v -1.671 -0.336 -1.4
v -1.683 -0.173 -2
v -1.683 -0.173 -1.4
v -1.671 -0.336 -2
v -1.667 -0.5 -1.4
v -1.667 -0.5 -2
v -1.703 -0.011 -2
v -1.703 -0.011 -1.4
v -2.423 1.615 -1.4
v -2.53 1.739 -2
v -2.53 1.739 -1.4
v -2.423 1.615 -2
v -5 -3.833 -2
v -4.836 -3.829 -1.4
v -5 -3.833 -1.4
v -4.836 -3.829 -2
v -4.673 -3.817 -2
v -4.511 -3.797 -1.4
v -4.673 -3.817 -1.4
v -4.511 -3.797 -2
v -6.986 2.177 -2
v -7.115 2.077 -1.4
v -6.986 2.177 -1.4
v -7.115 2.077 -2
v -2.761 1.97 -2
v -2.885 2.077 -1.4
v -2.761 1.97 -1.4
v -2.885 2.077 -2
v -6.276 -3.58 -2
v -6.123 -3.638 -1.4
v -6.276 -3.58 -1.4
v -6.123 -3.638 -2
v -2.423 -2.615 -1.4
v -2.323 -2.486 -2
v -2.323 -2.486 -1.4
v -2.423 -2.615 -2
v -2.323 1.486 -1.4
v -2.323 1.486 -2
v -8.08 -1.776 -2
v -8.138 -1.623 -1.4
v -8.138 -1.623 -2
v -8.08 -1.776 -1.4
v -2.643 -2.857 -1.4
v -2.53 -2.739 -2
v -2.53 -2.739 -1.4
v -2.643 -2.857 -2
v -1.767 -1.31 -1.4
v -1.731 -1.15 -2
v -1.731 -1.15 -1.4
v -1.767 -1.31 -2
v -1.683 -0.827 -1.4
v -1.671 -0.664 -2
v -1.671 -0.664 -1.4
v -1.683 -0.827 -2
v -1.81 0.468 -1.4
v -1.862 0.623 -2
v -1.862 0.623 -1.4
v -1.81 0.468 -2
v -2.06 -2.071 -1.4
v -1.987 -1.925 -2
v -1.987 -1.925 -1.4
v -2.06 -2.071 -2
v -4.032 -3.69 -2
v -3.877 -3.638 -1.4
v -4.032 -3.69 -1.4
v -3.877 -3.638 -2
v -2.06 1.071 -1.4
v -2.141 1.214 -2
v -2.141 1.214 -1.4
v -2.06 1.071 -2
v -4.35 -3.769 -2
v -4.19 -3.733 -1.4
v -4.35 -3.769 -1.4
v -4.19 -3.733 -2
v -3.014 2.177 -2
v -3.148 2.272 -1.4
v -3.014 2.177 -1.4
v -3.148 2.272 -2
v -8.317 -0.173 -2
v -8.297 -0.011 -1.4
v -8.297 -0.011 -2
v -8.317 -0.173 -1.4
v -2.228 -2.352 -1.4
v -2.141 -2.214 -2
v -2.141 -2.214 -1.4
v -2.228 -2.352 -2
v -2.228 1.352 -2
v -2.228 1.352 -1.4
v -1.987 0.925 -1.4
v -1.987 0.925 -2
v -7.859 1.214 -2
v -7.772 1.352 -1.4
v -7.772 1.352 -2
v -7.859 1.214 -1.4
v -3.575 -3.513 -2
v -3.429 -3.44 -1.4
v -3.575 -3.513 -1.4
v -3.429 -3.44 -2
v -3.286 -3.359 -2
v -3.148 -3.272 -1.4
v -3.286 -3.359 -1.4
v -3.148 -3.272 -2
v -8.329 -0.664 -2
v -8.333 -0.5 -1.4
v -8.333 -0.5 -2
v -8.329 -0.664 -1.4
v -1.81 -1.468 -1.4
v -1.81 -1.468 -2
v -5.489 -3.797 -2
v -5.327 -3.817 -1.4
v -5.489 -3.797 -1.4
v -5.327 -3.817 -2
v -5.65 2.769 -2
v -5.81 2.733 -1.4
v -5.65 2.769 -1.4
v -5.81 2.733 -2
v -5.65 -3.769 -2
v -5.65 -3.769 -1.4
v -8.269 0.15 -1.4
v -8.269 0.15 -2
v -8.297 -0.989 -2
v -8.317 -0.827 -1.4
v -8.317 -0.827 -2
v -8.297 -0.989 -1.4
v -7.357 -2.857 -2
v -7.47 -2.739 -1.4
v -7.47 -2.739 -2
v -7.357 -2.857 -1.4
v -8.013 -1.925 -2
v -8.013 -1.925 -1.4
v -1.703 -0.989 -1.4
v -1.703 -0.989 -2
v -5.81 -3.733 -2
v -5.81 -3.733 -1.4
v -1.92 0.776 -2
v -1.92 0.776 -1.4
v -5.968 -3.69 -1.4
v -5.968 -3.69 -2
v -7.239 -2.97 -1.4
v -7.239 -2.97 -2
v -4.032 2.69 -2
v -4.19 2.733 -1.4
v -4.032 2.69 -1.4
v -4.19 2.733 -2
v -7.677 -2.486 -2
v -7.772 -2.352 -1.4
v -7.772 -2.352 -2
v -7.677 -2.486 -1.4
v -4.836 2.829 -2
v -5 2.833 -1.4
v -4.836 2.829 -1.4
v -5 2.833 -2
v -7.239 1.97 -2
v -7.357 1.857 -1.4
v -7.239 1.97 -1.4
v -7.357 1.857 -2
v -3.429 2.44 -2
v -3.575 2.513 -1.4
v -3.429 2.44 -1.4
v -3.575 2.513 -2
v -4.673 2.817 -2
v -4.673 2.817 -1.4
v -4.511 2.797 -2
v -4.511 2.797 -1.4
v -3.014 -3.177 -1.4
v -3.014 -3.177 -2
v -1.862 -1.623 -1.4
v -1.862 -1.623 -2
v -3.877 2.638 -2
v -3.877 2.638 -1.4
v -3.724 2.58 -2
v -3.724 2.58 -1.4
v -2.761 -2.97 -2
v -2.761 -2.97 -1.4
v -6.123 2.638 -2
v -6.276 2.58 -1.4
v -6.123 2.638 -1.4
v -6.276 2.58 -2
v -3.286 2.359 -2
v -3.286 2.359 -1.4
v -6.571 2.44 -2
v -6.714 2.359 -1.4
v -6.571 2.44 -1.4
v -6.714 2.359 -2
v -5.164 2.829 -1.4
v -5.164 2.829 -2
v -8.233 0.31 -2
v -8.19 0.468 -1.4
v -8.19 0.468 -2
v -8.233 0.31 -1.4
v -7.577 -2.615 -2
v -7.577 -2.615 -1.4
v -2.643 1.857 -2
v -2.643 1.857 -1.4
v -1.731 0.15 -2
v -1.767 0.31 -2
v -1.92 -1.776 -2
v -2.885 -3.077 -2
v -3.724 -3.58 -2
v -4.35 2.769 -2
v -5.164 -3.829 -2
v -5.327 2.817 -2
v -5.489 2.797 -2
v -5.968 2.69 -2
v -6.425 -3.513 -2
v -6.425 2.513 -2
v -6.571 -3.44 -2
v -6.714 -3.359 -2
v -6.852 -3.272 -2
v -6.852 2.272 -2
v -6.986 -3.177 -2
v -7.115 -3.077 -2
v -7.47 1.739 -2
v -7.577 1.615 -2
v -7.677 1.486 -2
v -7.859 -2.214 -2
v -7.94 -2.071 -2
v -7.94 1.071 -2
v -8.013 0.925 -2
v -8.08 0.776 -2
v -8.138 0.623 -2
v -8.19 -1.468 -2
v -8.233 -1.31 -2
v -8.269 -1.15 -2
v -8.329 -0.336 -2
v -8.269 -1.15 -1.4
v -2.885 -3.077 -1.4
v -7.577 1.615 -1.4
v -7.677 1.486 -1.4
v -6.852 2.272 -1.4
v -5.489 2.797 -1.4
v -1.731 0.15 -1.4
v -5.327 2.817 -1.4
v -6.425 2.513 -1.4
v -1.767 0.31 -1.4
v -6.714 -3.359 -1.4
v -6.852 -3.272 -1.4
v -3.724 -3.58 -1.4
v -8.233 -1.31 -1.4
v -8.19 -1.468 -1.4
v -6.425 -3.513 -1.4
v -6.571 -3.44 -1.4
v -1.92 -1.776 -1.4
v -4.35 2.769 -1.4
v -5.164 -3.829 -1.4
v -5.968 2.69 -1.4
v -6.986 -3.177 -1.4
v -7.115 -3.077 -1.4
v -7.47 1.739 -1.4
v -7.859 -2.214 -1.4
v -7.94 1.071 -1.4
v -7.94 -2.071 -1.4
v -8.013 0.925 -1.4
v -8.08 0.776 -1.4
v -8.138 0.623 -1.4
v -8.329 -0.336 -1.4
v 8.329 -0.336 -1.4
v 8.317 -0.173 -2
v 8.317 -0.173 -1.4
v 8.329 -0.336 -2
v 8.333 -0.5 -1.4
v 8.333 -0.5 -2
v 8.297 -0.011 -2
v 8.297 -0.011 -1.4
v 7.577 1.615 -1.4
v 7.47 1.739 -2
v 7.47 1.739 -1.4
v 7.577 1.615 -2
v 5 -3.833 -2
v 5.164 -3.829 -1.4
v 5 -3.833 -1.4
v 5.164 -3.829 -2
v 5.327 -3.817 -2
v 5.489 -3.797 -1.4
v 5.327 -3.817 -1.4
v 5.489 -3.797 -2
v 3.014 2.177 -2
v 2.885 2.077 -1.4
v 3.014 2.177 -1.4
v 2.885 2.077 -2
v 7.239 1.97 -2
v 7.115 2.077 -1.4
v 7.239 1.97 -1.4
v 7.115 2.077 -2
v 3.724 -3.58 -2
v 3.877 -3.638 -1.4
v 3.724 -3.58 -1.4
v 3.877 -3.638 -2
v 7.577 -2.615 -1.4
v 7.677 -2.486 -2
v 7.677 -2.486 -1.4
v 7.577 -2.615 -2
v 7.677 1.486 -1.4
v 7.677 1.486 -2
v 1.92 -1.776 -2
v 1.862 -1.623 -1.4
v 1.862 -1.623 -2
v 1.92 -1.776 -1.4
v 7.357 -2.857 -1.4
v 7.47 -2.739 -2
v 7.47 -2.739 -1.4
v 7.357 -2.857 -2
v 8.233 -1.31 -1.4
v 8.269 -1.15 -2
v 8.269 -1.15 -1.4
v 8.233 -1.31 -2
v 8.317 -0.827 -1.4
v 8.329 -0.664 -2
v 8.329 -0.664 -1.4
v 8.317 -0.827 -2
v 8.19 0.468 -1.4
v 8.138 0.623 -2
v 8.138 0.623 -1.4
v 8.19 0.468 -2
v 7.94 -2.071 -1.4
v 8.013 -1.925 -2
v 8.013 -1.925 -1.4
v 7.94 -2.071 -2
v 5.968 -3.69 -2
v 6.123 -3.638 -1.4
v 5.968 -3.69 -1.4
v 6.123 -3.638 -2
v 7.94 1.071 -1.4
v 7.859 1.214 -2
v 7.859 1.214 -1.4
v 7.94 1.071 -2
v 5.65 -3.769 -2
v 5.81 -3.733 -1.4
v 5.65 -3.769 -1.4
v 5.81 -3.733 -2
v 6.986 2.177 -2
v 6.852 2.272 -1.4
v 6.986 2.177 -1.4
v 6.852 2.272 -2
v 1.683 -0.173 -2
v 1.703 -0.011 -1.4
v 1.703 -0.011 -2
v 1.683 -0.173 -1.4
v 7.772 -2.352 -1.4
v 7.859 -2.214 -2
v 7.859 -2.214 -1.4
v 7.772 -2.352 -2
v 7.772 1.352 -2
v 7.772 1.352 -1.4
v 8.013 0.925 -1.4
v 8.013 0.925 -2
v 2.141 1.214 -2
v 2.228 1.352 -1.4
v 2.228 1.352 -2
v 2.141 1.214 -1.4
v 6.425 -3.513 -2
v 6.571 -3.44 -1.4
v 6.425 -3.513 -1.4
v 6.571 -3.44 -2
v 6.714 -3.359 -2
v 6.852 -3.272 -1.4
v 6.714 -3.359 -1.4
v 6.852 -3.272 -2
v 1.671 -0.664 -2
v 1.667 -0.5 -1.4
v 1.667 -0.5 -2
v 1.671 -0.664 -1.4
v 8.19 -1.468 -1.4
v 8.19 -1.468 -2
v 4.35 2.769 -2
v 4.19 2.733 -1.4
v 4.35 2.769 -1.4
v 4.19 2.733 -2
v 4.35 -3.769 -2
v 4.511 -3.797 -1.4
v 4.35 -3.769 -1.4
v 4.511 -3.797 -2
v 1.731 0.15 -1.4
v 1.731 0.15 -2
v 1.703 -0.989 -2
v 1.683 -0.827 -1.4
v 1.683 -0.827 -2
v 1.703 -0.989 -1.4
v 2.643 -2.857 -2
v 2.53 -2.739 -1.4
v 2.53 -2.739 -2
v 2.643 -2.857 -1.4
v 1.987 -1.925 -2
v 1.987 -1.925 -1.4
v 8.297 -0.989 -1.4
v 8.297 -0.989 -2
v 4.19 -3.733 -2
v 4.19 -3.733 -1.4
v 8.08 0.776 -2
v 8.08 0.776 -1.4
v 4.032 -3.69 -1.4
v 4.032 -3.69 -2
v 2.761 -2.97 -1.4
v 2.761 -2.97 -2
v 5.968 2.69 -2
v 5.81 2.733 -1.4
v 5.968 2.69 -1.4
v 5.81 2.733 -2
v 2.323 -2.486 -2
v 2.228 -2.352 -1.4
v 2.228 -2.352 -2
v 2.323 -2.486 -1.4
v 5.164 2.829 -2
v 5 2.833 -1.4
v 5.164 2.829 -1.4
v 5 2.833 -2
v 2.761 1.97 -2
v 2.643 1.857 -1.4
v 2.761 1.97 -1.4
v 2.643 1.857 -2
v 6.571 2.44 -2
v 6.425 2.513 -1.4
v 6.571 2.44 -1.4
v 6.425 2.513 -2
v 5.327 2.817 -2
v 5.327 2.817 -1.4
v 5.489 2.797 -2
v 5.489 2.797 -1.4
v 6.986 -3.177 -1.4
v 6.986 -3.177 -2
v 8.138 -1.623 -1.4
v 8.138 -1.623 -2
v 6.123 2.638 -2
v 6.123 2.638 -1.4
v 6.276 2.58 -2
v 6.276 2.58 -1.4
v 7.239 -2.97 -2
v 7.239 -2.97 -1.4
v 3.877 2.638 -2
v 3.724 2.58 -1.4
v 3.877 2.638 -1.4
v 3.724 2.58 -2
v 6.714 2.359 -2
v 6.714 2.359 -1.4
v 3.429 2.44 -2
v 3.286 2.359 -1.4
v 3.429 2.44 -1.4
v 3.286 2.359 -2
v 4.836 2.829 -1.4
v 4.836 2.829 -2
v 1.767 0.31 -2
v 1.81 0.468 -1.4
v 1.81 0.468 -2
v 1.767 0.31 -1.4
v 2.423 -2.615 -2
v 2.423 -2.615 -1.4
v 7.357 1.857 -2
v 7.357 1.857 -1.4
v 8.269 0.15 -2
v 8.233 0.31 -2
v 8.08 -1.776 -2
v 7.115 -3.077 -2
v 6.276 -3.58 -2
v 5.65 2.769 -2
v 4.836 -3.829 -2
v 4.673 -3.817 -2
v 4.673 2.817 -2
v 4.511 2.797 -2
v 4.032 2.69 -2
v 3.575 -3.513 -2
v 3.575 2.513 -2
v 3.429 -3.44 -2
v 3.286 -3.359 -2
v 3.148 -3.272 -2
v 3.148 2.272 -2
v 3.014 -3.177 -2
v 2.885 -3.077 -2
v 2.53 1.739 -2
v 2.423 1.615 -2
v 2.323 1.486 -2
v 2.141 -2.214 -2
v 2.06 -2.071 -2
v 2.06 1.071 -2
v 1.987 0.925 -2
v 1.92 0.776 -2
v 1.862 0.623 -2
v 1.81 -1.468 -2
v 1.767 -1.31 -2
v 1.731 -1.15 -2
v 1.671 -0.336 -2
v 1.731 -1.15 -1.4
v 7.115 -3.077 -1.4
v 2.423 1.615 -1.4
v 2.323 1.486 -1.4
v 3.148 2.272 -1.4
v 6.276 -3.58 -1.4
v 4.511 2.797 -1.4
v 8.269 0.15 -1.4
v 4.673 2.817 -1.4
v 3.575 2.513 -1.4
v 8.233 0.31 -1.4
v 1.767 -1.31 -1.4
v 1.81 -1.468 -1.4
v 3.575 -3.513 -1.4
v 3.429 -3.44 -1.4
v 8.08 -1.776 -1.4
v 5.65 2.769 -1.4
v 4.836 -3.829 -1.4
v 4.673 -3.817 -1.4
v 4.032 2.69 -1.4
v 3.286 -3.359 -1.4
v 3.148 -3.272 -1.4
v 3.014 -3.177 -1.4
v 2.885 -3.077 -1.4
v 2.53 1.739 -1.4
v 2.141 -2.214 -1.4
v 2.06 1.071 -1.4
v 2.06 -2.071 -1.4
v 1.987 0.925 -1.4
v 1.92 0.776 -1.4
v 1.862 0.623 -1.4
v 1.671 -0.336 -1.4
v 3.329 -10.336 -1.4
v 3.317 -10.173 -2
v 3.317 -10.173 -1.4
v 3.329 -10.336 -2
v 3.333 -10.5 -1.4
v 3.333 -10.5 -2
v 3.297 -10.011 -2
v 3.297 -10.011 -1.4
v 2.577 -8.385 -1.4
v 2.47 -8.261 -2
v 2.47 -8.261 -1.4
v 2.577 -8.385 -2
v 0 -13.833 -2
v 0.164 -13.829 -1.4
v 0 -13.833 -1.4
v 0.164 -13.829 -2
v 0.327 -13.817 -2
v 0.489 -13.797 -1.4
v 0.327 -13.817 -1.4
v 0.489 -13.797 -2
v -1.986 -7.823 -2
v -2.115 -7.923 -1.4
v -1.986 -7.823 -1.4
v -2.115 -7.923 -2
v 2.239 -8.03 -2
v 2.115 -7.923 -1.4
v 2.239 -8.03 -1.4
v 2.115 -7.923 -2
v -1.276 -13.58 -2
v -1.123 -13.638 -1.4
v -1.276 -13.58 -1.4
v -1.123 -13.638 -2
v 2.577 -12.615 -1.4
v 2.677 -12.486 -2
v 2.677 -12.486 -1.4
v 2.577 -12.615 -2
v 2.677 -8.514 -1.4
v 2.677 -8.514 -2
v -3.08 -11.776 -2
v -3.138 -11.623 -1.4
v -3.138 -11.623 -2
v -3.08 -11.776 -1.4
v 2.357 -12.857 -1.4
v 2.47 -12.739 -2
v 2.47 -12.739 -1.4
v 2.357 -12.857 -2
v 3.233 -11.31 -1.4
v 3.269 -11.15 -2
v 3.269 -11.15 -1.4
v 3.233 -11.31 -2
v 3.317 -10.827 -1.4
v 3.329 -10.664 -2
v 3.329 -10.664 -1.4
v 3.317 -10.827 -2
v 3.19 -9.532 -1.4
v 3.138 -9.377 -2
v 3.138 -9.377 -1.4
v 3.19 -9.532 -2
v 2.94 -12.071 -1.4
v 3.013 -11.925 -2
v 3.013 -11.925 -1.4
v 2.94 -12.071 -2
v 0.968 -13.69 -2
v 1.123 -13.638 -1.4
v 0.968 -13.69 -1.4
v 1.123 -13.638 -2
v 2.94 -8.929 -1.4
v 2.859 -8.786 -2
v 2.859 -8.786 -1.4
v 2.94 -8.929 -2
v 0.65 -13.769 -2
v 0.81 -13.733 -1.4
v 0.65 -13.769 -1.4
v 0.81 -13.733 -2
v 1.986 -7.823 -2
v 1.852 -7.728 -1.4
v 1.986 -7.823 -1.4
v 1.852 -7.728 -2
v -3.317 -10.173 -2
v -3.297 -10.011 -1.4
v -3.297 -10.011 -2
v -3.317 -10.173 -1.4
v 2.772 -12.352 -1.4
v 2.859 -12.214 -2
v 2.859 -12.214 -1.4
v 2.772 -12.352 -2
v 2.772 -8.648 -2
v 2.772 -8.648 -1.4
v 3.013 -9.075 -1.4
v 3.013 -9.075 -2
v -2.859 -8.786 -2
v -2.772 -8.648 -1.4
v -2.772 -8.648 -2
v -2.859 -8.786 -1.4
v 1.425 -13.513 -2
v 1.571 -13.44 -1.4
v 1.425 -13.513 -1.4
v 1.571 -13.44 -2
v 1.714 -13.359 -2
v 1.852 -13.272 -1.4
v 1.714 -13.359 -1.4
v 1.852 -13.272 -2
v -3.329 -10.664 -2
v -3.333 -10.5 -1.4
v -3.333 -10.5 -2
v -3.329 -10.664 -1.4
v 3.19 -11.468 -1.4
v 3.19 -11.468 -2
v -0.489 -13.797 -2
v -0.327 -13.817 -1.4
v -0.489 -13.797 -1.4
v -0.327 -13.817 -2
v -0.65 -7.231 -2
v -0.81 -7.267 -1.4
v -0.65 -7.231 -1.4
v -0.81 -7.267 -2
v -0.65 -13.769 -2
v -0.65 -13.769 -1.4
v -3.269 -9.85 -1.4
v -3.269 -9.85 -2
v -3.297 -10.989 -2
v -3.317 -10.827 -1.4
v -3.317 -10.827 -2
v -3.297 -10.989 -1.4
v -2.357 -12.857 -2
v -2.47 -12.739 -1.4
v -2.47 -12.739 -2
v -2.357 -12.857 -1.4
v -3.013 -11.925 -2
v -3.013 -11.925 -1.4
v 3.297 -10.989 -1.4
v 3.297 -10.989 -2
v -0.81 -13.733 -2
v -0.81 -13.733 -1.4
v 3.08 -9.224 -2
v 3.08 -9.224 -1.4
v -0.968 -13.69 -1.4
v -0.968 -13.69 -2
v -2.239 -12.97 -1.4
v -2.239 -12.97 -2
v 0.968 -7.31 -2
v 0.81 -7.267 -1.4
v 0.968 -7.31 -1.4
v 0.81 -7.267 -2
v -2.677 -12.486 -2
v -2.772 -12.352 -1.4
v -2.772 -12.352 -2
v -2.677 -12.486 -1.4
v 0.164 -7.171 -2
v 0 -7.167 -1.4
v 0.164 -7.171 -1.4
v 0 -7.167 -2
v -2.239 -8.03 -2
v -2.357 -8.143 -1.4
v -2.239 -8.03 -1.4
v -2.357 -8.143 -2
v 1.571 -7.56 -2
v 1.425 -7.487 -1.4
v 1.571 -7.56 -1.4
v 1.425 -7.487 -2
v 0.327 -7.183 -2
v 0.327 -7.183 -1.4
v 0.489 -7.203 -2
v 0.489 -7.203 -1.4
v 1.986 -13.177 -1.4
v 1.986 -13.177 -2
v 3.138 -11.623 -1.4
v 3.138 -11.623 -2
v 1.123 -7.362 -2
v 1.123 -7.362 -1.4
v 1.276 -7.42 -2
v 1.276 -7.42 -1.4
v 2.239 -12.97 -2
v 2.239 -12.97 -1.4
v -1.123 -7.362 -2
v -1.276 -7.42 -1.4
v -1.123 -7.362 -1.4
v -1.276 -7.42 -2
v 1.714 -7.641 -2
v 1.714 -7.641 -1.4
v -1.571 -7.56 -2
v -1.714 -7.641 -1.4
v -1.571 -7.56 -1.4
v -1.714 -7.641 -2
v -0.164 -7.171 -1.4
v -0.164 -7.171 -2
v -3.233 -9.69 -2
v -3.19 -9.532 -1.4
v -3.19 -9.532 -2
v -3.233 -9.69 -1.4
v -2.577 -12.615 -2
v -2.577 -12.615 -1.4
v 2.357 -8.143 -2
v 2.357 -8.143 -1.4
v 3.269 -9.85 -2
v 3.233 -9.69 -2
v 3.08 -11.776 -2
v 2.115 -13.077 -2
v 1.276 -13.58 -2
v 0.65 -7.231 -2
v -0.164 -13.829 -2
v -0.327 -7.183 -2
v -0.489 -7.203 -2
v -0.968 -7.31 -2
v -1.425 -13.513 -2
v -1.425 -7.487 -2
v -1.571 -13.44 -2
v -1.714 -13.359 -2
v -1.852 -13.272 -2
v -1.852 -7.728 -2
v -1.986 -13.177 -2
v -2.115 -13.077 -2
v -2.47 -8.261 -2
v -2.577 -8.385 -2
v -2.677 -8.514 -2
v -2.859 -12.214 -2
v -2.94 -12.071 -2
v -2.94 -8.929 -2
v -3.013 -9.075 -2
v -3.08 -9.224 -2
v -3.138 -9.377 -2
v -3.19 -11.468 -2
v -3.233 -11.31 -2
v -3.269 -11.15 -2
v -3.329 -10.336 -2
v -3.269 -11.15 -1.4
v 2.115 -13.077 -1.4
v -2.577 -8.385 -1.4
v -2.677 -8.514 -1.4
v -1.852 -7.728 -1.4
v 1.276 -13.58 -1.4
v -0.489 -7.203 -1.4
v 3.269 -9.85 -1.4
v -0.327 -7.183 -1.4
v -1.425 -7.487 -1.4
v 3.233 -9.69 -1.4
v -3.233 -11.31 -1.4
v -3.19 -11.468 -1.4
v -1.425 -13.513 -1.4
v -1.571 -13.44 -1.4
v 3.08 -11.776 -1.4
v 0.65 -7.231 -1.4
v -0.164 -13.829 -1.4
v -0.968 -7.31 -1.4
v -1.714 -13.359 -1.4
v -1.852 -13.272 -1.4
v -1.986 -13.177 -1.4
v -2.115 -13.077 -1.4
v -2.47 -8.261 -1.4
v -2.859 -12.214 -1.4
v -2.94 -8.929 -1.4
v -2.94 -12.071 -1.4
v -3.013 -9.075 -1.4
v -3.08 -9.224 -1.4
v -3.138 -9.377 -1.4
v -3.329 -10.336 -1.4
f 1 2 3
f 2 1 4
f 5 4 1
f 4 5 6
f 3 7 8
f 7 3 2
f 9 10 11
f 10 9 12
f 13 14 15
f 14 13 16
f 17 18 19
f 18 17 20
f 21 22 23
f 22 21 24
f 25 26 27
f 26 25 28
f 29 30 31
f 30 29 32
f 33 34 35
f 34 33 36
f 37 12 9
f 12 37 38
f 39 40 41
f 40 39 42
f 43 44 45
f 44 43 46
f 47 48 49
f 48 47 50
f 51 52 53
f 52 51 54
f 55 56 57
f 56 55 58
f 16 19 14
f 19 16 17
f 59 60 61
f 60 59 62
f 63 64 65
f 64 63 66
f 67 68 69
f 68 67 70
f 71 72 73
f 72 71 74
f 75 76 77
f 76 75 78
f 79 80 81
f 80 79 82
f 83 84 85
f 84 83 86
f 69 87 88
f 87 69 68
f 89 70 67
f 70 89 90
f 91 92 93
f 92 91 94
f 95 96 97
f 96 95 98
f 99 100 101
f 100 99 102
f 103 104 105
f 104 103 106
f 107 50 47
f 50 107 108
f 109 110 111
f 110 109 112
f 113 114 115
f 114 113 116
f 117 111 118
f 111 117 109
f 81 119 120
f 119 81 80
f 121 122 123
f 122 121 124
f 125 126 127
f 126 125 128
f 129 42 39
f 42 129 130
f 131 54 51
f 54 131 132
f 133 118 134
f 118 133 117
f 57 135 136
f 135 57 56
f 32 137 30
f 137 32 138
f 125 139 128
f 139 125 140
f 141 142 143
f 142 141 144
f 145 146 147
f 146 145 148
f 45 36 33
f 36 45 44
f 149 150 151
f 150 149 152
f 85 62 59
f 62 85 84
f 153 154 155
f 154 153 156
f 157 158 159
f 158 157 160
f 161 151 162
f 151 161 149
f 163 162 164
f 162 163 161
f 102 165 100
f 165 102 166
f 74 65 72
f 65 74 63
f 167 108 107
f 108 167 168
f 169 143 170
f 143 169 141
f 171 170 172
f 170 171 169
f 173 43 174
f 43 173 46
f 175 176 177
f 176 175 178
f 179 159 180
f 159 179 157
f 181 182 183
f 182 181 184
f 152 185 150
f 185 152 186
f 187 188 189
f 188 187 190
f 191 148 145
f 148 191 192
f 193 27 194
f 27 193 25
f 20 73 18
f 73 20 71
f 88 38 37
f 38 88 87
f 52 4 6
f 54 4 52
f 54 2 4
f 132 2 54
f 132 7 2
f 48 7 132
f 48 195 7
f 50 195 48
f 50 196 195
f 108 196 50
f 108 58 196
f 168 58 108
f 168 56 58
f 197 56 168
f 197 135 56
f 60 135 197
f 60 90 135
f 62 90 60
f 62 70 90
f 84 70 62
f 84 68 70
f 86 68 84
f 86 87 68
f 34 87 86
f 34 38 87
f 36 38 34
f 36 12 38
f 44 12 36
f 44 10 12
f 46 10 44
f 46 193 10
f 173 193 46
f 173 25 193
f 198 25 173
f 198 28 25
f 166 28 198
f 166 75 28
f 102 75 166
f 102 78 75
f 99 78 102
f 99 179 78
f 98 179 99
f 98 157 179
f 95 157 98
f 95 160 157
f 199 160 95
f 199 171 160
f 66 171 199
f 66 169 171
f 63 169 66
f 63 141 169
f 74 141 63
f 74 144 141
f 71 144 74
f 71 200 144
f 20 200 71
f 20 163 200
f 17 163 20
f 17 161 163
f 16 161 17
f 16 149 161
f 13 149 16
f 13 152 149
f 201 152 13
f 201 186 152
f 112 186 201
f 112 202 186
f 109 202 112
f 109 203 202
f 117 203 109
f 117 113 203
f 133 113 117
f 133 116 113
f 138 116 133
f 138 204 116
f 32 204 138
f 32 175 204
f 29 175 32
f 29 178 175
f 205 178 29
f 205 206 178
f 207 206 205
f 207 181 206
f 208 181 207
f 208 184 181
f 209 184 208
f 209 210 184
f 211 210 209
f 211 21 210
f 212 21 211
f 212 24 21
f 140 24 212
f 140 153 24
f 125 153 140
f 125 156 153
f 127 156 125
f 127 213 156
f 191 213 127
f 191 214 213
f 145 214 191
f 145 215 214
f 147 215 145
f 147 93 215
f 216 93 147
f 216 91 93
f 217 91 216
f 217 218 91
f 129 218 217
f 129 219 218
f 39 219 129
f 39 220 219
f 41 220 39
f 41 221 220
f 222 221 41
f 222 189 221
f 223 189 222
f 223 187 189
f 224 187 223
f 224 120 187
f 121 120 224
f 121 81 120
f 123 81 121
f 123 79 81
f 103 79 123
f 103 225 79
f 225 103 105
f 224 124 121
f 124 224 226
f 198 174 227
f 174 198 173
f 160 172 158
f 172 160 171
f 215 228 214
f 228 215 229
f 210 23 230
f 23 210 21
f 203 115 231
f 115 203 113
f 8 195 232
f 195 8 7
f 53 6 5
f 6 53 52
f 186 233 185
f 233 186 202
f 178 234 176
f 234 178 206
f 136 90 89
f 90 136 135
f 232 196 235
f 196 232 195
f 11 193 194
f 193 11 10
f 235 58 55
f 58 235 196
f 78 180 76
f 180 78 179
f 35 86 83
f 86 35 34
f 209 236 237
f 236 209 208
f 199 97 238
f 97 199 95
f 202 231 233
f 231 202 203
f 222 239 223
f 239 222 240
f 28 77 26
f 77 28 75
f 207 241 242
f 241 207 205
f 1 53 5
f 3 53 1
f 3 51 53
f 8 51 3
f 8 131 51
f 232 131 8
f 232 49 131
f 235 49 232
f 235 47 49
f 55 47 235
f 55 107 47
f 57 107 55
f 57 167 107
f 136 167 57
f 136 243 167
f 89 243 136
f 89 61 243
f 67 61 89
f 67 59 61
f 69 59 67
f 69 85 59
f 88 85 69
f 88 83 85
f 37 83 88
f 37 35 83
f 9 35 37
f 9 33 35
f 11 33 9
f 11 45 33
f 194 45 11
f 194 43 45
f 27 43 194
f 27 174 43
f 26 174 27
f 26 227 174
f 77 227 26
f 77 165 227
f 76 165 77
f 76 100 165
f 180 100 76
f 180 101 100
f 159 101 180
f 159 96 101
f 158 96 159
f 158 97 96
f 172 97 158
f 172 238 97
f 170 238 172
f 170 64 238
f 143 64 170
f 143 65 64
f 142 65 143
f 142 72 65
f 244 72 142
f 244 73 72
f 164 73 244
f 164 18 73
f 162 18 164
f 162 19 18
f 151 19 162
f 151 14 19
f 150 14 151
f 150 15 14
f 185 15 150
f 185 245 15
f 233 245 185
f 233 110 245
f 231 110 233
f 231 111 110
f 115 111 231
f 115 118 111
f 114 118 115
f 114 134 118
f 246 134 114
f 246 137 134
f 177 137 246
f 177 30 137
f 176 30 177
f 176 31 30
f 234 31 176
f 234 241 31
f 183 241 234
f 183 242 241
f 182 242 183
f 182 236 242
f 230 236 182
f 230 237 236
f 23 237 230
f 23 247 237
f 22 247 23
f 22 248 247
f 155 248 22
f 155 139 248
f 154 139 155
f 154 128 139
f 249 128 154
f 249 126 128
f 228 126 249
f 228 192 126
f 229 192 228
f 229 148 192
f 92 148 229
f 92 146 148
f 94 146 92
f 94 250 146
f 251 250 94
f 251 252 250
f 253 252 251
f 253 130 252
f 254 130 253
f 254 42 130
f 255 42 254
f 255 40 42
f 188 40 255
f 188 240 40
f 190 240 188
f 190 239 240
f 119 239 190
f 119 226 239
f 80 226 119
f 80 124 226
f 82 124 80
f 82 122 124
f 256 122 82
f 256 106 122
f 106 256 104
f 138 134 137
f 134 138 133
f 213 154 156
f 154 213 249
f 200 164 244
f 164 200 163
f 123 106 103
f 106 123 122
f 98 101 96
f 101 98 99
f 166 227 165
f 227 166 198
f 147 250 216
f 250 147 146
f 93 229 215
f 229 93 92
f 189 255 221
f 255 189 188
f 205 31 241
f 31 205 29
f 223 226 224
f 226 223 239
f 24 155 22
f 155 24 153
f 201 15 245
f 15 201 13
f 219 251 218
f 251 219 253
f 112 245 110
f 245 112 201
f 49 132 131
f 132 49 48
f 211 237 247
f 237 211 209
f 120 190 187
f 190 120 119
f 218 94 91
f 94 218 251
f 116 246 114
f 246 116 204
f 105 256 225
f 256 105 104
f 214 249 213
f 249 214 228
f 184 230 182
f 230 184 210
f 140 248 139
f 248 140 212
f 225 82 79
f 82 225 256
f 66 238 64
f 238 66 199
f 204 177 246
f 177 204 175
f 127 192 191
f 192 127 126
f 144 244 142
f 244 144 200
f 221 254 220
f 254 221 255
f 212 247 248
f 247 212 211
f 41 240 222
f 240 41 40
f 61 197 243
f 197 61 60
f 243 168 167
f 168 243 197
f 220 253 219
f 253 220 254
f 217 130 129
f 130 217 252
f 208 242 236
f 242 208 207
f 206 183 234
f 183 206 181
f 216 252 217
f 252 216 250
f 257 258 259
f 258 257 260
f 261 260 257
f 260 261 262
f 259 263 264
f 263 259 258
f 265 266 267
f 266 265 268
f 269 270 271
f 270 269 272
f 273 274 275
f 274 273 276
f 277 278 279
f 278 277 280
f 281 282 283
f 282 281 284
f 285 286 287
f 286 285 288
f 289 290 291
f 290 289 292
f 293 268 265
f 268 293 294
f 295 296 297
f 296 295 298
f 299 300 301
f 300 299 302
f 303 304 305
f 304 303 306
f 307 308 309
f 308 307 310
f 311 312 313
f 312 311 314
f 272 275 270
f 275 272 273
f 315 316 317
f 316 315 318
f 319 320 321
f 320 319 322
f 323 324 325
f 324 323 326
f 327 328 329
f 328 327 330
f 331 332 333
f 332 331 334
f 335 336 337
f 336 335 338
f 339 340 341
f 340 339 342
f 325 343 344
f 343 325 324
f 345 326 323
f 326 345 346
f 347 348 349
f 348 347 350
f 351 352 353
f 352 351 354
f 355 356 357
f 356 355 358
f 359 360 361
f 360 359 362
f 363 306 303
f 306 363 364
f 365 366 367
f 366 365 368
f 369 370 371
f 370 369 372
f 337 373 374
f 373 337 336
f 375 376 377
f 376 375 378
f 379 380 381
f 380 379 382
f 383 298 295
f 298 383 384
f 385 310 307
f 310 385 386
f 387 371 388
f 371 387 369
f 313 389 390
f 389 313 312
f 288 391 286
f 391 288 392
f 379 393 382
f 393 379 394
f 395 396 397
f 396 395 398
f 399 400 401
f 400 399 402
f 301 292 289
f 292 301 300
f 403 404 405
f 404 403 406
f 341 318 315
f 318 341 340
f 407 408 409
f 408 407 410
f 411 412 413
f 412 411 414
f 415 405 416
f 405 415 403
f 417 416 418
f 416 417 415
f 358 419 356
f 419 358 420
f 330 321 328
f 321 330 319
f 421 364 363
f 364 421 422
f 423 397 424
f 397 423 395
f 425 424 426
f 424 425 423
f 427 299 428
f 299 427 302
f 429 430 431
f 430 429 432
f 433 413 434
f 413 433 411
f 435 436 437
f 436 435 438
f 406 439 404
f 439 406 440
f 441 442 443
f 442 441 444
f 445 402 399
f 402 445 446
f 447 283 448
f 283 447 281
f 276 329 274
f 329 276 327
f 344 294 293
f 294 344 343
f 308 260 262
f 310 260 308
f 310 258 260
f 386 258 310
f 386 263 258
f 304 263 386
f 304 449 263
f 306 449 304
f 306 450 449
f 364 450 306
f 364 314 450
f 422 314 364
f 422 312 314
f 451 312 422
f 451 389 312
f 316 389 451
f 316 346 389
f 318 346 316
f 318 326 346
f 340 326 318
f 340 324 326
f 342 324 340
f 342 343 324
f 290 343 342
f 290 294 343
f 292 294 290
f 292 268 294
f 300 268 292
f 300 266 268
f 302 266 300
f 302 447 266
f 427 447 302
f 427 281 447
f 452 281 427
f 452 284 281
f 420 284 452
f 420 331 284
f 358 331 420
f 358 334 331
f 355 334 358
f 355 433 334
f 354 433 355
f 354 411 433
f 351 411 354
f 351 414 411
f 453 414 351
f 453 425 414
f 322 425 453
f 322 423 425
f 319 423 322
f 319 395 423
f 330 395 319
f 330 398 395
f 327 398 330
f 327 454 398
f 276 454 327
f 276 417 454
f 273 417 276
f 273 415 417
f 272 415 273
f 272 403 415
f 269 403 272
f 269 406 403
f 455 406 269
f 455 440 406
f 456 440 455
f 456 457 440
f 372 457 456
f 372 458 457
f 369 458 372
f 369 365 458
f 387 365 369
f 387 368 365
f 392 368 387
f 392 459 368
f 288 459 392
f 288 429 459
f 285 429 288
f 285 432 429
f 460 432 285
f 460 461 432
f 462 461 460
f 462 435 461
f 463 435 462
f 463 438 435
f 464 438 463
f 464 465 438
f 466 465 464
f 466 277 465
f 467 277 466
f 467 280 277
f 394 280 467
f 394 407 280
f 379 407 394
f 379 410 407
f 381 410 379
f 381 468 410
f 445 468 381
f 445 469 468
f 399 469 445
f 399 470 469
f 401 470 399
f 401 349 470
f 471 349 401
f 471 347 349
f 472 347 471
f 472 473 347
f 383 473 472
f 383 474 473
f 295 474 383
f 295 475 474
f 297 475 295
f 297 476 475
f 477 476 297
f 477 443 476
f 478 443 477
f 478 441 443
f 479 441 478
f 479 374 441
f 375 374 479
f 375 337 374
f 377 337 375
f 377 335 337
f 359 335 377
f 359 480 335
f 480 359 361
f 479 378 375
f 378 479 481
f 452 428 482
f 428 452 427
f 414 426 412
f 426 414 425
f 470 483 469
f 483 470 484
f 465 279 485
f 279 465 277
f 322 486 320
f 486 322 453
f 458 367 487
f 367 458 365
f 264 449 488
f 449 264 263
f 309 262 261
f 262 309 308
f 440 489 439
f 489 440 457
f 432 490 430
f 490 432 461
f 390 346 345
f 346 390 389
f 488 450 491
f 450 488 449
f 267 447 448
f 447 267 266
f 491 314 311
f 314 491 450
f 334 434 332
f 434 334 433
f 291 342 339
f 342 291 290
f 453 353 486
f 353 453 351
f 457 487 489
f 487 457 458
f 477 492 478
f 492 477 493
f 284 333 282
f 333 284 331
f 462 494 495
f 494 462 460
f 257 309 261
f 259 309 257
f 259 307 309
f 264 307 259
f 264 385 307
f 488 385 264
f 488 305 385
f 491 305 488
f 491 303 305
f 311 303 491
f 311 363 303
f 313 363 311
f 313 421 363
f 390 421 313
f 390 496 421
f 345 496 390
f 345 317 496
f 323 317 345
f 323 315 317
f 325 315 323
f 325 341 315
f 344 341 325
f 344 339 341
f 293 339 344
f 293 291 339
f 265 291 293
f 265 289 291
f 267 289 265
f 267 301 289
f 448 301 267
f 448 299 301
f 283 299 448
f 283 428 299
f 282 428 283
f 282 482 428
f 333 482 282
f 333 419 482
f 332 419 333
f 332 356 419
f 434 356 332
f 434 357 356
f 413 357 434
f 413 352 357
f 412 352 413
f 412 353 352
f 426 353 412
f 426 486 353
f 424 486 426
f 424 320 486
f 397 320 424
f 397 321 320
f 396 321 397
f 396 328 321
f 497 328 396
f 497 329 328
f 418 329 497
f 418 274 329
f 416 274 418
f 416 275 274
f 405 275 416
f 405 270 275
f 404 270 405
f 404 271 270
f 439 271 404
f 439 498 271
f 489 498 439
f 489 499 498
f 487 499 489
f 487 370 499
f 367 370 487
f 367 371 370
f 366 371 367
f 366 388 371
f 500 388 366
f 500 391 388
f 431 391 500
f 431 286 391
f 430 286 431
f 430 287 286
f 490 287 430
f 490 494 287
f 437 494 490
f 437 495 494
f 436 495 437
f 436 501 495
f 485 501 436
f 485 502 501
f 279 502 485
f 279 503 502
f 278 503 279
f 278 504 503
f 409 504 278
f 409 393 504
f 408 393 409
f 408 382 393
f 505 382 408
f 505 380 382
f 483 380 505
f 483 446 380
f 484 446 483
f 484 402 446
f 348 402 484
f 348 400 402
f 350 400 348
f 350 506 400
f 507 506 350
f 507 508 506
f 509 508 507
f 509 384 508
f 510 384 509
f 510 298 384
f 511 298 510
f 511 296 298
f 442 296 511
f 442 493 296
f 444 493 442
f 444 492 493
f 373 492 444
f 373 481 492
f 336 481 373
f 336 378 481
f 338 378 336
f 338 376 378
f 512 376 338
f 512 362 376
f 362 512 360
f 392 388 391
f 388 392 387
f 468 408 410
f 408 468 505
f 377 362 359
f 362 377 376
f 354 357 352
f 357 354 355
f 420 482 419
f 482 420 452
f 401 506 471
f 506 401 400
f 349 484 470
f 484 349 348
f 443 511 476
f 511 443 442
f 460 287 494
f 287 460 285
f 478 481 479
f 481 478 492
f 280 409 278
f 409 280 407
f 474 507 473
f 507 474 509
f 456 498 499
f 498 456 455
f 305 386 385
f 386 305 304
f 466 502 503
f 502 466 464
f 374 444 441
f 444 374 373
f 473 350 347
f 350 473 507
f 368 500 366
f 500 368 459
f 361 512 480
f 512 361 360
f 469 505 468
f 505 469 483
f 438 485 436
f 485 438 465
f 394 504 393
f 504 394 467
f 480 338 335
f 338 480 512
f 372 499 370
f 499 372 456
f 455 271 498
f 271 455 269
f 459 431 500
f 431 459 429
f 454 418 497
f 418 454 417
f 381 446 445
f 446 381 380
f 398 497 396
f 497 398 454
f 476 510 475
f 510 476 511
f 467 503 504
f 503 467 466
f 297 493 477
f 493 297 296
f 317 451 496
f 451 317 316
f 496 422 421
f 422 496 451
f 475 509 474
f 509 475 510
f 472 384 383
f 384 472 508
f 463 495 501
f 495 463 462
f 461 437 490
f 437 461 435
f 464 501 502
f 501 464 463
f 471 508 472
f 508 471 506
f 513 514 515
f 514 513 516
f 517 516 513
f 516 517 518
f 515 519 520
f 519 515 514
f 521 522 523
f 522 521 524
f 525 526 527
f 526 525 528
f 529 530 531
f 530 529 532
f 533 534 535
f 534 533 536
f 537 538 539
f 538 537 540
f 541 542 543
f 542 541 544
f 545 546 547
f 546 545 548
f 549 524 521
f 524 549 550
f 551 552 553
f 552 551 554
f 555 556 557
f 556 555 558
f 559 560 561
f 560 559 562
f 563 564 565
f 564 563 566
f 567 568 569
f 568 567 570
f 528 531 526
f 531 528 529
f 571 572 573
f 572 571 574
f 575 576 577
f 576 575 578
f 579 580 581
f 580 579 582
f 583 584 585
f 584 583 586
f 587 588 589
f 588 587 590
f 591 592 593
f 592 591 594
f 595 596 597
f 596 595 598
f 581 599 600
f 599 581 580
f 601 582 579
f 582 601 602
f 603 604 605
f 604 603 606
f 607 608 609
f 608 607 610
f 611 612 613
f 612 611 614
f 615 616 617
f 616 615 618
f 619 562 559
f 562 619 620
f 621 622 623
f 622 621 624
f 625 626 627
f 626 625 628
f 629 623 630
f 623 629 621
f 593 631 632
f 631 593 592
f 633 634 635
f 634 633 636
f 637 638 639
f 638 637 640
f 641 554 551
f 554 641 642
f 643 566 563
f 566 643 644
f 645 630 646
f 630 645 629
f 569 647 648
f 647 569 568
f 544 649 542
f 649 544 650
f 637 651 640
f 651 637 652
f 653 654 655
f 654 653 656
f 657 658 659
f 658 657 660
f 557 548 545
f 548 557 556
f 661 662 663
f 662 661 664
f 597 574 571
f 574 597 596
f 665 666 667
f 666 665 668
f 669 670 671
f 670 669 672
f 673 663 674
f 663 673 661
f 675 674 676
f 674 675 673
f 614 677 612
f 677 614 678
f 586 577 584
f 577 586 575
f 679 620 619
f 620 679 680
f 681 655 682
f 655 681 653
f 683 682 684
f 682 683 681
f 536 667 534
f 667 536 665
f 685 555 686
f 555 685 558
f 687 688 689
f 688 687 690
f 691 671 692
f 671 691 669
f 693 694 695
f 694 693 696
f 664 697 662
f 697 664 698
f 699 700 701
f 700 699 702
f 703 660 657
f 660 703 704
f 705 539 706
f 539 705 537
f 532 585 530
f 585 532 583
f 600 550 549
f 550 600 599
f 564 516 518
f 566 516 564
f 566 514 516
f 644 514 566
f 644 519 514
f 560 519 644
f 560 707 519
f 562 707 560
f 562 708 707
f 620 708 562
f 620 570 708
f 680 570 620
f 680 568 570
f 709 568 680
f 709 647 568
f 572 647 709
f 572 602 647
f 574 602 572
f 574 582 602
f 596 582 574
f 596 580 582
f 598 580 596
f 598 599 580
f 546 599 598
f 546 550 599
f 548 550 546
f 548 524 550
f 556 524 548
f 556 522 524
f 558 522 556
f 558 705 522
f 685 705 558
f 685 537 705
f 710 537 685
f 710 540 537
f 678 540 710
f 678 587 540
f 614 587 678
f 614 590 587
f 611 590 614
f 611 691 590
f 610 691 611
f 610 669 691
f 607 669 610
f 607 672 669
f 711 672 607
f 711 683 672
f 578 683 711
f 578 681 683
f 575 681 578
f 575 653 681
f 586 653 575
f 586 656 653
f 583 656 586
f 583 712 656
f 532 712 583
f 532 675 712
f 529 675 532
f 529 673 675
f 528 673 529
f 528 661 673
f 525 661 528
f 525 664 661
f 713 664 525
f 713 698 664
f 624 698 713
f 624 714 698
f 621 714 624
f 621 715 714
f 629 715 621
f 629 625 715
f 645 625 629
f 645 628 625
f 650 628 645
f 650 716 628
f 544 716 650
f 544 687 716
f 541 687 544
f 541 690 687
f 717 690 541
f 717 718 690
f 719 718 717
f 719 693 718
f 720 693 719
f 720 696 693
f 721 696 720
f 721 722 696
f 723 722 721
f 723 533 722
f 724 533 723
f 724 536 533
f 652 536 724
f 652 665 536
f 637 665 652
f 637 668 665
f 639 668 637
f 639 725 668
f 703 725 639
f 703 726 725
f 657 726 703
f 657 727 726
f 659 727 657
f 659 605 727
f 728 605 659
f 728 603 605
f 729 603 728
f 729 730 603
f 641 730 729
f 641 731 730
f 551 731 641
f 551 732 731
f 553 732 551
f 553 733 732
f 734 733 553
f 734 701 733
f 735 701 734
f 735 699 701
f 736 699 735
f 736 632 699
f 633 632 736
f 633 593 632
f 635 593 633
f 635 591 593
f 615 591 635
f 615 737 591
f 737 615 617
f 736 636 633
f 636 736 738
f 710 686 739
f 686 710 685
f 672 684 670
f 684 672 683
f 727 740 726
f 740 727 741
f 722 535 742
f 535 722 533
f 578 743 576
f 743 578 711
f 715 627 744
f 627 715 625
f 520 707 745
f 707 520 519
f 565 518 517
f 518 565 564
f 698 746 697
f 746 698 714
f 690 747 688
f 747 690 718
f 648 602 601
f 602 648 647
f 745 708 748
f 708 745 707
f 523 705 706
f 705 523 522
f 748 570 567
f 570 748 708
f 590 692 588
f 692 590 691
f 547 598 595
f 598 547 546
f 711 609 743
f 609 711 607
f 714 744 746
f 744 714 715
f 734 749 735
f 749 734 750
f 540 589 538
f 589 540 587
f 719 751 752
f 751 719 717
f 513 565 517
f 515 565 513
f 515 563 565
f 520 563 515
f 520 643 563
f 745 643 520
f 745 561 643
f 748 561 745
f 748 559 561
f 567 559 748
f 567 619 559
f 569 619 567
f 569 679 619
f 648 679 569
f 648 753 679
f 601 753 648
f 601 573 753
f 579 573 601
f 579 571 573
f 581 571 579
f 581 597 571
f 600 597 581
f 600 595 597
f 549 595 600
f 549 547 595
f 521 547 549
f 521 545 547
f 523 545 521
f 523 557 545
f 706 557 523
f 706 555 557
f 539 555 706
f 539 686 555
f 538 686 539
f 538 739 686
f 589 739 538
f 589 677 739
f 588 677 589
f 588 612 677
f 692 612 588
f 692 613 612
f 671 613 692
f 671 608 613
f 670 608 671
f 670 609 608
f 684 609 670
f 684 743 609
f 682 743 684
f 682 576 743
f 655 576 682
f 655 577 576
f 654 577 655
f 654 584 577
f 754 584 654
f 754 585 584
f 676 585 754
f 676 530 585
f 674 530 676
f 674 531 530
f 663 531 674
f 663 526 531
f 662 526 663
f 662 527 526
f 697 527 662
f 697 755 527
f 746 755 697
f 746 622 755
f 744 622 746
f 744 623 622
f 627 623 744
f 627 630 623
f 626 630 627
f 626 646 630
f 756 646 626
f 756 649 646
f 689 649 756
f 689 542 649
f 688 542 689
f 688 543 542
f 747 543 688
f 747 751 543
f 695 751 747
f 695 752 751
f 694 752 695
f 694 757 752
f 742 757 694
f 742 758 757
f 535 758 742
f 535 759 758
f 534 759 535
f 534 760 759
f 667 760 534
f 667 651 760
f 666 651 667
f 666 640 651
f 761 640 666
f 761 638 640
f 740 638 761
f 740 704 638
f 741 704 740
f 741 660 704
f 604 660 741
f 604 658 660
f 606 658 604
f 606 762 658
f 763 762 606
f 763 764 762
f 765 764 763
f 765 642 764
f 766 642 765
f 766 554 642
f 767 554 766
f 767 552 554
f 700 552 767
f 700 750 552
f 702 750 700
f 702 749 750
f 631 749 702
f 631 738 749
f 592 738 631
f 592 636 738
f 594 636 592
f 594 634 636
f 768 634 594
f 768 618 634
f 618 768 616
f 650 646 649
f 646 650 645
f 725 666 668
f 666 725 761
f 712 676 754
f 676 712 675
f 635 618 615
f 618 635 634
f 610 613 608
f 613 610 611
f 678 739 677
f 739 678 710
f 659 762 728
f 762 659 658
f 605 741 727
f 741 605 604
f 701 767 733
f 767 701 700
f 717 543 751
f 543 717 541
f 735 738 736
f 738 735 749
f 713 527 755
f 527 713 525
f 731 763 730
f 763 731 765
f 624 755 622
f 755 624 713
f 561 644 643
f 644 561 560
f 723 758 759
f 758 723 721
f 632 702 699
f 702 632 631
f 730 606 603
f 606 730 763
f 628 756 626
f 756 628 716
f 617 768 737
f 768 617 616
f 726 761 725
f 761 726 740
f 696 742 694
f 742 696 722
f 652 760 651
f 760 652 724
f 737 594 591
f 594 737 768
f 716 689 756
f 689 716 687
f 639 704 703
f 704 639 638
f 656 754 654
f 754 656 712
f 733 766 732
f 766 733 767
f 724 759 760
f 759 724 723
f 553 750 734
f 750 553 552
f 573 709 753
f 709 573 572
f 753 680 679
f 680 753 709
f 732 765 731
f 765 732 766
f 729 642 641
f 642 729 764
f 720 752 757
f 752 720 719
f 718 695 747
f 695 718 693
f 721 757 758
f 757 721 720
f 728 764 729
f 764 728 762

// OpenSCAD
// file: ../parts/train_integrity_body.scad
/* RailEduKit/InteractiveSignallingLaboratory © 2025 by Martin Scheidt and contributors
 * License: CC-BY 4.0 - https://creativecommons.org/licenses/by/4.0/
 * Project description: The Interactive Signalling Laboratory is a tool for training in Rail
 * Applications to enhance the knowledge of control and signalling principles for rail transport systems.
 *
 * Module: train_integrity_body
 */

// Include configuration file
include <../config/global_variables.scad>
include <../config/colors.scad>

thinnest_layer     = 0.2;

coupling_radius    = 13/2;
coupling_depth     = 8;
coupling_cut_pos   = coupling_radius*1/2;
boogie_width       = 20;
coupler_thickness  = 1.5;
lipp_height        = 4;
lipp_width         = coupler_thickness - move_tolerance;
shield_width       = 20;
shield_depth       = 25;
inlay_thickness    = 0.45;
shield_thickness   = 2; // the shield has to be at least 2mm thick. Otherwise the front symbol will be printed badly
inlay_radius       = 10.5/2;

symbol_height 	   = 0.6;

module train_integrity_body() {
	color(BASE_COLOR) union(){
	difference() { // coupling
		// outer ring
		cylinder(h = coupling_depth, r = coupling_radius + move_tolerance / 2 + coupler_thickness);
		// inner ring
		translate([ 0, 0, -coupler_thickness / 2 ])
		cylinder(h = coupling_depth + coupler_thickness, r = coupling_radius + move_tolerance / 2);
		// cutting the lower edge
		translate([ -coupling_radius * 1.3, coupling_cut_pos, -coupler_thickness / 2 ])
		cube([ coupling_radius * 2.6, coupling_radius * 1.2, coupling_depth + coupler_thickness ]);
	}

	union() { // upper board
		// beam
		translate([ -boogie_width / 2, -(coupling_radius + coupler_thickness + move_tolerance / 2), 0 ])
		cube([ boogie_width, coupler_thickness, coupling_depth ]);
		// lipp
		hull() {
			translate([
				-boogie_width / 2, -(coupling_radius + move_tolerance / 2 + coupler_thickness - lipp_width),
				coupling_depth
			])
			cube([ boogie_width, thinnest_layer, lipp_height / 4 ]);
			translate(
			    [ -boogie_width / 2, -(coupling_radius + move_tolerance / 2 + coupler_thickness), coupling_depth ])
			cube([ boogie_width, thinnest_layer, lipp_height ]);
		}
	}

	difference() { // front shield
		translate([ -shield_width / 2, -(shield_depth) / 2 - coupling_radius + 1, -shield_thickness ]) 
		cube([ shield_width, shield_depth, shield_thickness ]);
		translate([ 0, 0, -inlay_thickness ])
		cylinder(h = inlay_thickness, r = inlay_radius);
	}
	}
}

//train_integrity_body();
// file: ../config/colors.scad
/* RailEduKit/InteractiveSignallingLaboratory © 2025 by Martin Scheidt and contributors
 * License: CC-BY 4.0 - https://creativecommons.org/licenses/by/4.0/
 * Project description: The Interactive Signalling Laboratory is a tool for training in Rail
 * Applications to enhance the knowledge of control and signalling principles for rail transport systems.
 *
 * Module: config/colors.scad
 */

// component colors
BASE_COLOR = "black";
INDICATOR_COLOR = "white";
ROUTE_COLOR = "blue";

// signal colors
ASPECT_CLEAR = "green";
ASPECT_APPROACH = "yellow";
ASPECT_STOP = "red";
// file: ../config/global_variables.scad
/* RailEduKit/InteractiveSignallingLaboratory © 2025 by Martin Scheidt and contributors
 * License: CC-BY 4.0 - https://creativecommons.org/licenses/by/4.0/
 * Project description: The Interactive Signalling Laboratory is a tool for training in Rail
 * Applications to enhance the knowledge of control and signalling principles for rail transport systems.
 *
 * Module: config/global_variables.scad
 */

/* 
++++++++++++++++++++++++ Start of New Structure +++++++++++++++++++++++++++++++++++

the structure should orientate on the file structure
but some variables have to stand on the top of the structure


 */

{// assemblies
    {// balise
            
    }
    {// checkbox_route
        
    }
    {// clearing_point_block

    }
    {// clearing_point_route

    }
    {// direction_management_box

    }
    {// direction_management_lever

    }
    {// locking_pin

    }
    {// overlap_measure

    }
    {// position_indicator_number

    }
    {
        
    }
}
{// jigs


}









/* 
++++++++++++++++++++++++ End of New Structure +++++++++++++++++++++++++++++++++++
 */

/*************** resolution ***************/
// number of fragments; default 0;
//When this variable has a value greater than zero, the two variables $fa and $fs are ignored
$fn = $preview ? 32 : 128;

// $fa = 12;// minimum angle for a fragment; default 12; minimum allowed value is 0.01
// $fs = 2;// minimum size of a fragment; default 2; minimum allowed value is 0.01

/*****
To have the dimensions of all components at one place
*******/

/*******
TODO
- standard on which part the move tolerance is substracted?
******/
// ATTENTION: Note the general move_tolerance of 0.5

move_tolerance = 0.5;

nozzle_diameter = 0.4;

{/***************wood rail specification***************/
    // rail instead of wood to prevent duplicate variables with tracklib.scad file
    rail_height = 12;
    rail_width = 40;
    rail_thickness_track = 6;
    rail_well_height = 9; // copy from tracklib
    rail_well_width = 5.7; // copy from tracklib
    rail_well_spacing = 19.25; // copy from tracklib
    rail_groove_depth = rail_height - rail_well_height;

    straight_length = 144;

    curve_inner_radius = 180; // 182; // inner radius
    curve_middle_radius = curve_inner_radius+rail_width/2;
    curve_outer_radius = curve_inner_radius+rail_width;
    curve_angle = 45.7; // degree
    curve_length_middle_radius = (2*PI*curve_middle_radius*curve_angle)/360;
}
{/***************magnet specifications***************/

}
{/***************engraving specifications***************/
    engraving_height = 2;//(block_height-handle_height)/2;
    engraving_thickness = 1.5;
    
  
    fine_line = 0.2;
    thin_line = 0.8;
    regular_line = 1;
}



{/***************basis_component-roundedBox***************/
    body_width = 30;
    body_depth = 50;
    body_height = 13.5; 
    track_arc_inner_radius = 182;
    sagitta = 0.43; //DE: Pfeilhöhe -> 25mm Straighten round edge in the middle
}


{/***************overlap_measure***************/    
}

{/***************straight***************/
    //straight = s
    // pin hole 1 = ph1
    s_ph_xpos = rail_width/2;
    s_ph1_ypos = 30;
    s_ph2_ypos = straight_length/2;
    s_ph3_ypos = straight_length-s_ph1_ypos;
    
    // magnet hole = mh
    s_mh_xpos = rail_width;
    s_mh_zpos = rail_height/2;
    s_mh_ypos1 = 7.5;
    s_mh_ypos2 = straight_length-s_mh_ypos1;
    
    
}

{/***************curve***************/
    

    // curve = c
    // pin hole 1 = ph1
    c_alpha = (s_ph1_ypos * 360)/(2*PI*curve_middle_radius);
    c_ph1_ypos = sin(c_alpha) * curve_middle_radius;
    c_ph1_xpos = curve_outer_radius - cos(c_alpha) * curve_middle_radius;
    // pin hole 2 = ph2
    c_beta = curve_angle/2;
    c_ph2_ypos = sin(c_beta) * curve_middle_radius;
    c_ph2_xpos = curve_outer_radius - cos(c_beta) * curve_middle_radius;
    // pin hole 3 = ph3
    c_gamma = curve_angle - c_alpha;
    c_ph3_ypos = sin(c_gamma) * curve_middle_radius;
    c_ph3_xpos = curve_outer_radius - cos(c_gamma) * curve_middle_radius;

    // echo("  ");
    // echo("c_ph1_ypos", c_ph1_ypos);
    // echo("c_ph1_xpos", c_ph1_xpos);
    // echo("  ");
    // echo("c_ph2_ypos", c_ph2_ypos);
    // echo("c_ph2_xpos", c_ph2_xpos);
    // echo("  ");
    // echo("c_ph3_ypos", c_ph3_ypos);
    // echo("c_ph3_xpos", c_ph3_xpos);
    // echo("  ");

    c_mh_zpos = rail_height/2;
    // magnet hole 4 = mh1
    c_mh4_xpos = 0.1;
    c_mh4_ypos = 7.7;
    c_mh4_zrot = -2;
    // magnet hole 5 = mh1
    c_mh5_xpos = 40.3;
    c_mh5_ypos = 7.5;
    c_mh5_zrot = -2.4;
    // magnet hole 6 = mh1
    c_mh6_xpos = 61;
    c_mh6_ypos = 152;
    c_mh6_zrot = -43.7;
    // magnet hole 7 = mh1
    c_mh7_xpos = 89.05;
    c_mh7_ypos = 123.35;
    c_mh7_zrot = -43.3;
    
}



{/***************switch_blade***************/

}
{/***************switch_body***************/

}

{/***************locking_pin***************/
    
}
{/***************distant and block signal***************/
}

{/***************drill_template_straight***************/
    drill_move_tolerance = 0.3;
    // drill straight ground
    dsg_thickness = 5;
    dsg_hole_depth = 5;
    // drill straight cutout = dsc
    dsc_connector_width = 15;
    dsc_connector_height = 15;
    dsc_y_pos = 12;
    dsc_depth = rail_height+drill_move_tolerance;

    dsc_connector_z_pos = dsg_thickness+12;
    dsc_supporting_surface_width = 50;

    // drill straight hole
    dsh_y_pos = dsc_depth/2;
    dsh_x_pos = 7.5;

    // drill straigth base = dsb
    dsb_depth = 2*dsc_y_pos+dsc_depth;
    dsb_height = dsg_thickness+rail_width;//27;
}

{/***************drill_template_curve***************/
    // drill template curve = dtc
    dtc_cutout_middle_angle = 45+5;

    dtc_cutout_z_pos = 12;
    dtc_cutout_height = dsc_depth;
    dtc_outer_radius = curve_inner_radius+rail_width;
    dtc_side_radius = curve_inner_radius + 28;
    dtc_middle_radius = curve_inner_radius + 12;
    dtc_inner_radius = curve_inner_radius;

    dtc_height = 2*dtc_cutout_z_pos+dtc_cutout_height;

    // drill template curve hole
    dtch_z_pos = dsc_depth/2;
    dtch_y_pos = 7.5;

    dtc_switch_hole_y_pos = straight_length-dtch_y_pos;
    
    // horizontal template = ht
    origin_shift = 10;
    ht_scope = 0.1;
    ht_male_connector_angle = 1.8; //6mm
    ht_height = rail_height/2;
    ht_beta = curve_angle+ht_male_connector_angle;
    male_connector_space_xpos = (curve_outer_radius)-cos(ht_beta)*curve_middle_radius;
    male_connector_space_ypos = sin(ht_beta)*curve_middle_radius;
    
    grip_hole_left_xpos = (curve_outer_radius)-cos(ht_beta/2)*curve_outer_radius;
    grip_hole_left_ypos = sin(ht_beta/2)*curve_outer_radius;
    grip_hole_right_xpos = (curve_outer_radius)-cos(ht_beta/2)*curve_inner_radius;
    grip_hole_right_ypos = sin(ht_beta/2)*curve_inner_radius;
}
{/***************drill_template_switch***************/
    // all needed values in "drill_template_curve" and "drill_template_straight"
}

{/***************magnet_rod***************/

    
}



{/***************direction_management***************/
}

{/***************number_plate***************/

}

{/***************balise***************/
}

{/***************train integrity***************/
}

{/***************switch locker***************/

}

{/***************route_indicator_straight***************/
    
}

{/***************route_indicator_curve***************/
    
}
// main file
/* RailEduKit/InteractiveSignallingLaboratory © 2025 by Martin Scheidt and contributors
 * License: CC-BY 4.0 - https://creativecommons.org/licenses/by/4.0/
 * Project description: The Interactive Signalling Laboratory is a tool for training in Rail
 * Applications to enhance the knowledge of control and signalling principles for rail transport systems.
 *
 * Module: train_integrity_symbol_front
 */

// Include configuration file
include <../config/global_variables.scad>
include <../config/colors.scad>

// include common parts
include <../parts/train_integrity_body.scad> // access variables


headlight_d = (1/3)*shield_width;

/* PRINT INSTRUCTION
To print the train integrity you have to export the symbol and the body seperately as STL.
Then you have to select the body STL and the symbol STL and load them TOGETHER at the same time in Bambu Studio.
Thus the two files are positioned at the same place and the symbol fills the holes in the body perfectly.
Then you can select the two parts seperately to color them.
Through this procedure you can print multiple colors in one layer.
 */


module train_integrity_symbol_front() {
	color(INDICATOR_COLOR)
	translate([ -shield_width / 2, -(shield_depth) / 2 - coupling_radius + 1, -shield_thickness ])
	union() {
		translate(
		    [ (1 / 12) * shield_width + headlight_d / 2, (shield_depth + (1 / 6) * shield_width + headlight_d) / 2, 0 ])
		cylinder(d = headlight_d, h = symbol_height);
		translate([
			(11 / 12) * shield_width - headlight_d / 2, (shield_depth + (1 / 6) * shield_width + headlight_d) / 2, 0
		])
		cylinder(d = headlight_d, h = symbol_height);
		translate([ (1 / 2) * shield_width, (shield_depth - (1 / 6) * shield_width - headlight_d) / 2, 0 ])
		cylinder(d = headlight_d, h = symbol_height);
	}
}

train_integrity_symbol_front();
